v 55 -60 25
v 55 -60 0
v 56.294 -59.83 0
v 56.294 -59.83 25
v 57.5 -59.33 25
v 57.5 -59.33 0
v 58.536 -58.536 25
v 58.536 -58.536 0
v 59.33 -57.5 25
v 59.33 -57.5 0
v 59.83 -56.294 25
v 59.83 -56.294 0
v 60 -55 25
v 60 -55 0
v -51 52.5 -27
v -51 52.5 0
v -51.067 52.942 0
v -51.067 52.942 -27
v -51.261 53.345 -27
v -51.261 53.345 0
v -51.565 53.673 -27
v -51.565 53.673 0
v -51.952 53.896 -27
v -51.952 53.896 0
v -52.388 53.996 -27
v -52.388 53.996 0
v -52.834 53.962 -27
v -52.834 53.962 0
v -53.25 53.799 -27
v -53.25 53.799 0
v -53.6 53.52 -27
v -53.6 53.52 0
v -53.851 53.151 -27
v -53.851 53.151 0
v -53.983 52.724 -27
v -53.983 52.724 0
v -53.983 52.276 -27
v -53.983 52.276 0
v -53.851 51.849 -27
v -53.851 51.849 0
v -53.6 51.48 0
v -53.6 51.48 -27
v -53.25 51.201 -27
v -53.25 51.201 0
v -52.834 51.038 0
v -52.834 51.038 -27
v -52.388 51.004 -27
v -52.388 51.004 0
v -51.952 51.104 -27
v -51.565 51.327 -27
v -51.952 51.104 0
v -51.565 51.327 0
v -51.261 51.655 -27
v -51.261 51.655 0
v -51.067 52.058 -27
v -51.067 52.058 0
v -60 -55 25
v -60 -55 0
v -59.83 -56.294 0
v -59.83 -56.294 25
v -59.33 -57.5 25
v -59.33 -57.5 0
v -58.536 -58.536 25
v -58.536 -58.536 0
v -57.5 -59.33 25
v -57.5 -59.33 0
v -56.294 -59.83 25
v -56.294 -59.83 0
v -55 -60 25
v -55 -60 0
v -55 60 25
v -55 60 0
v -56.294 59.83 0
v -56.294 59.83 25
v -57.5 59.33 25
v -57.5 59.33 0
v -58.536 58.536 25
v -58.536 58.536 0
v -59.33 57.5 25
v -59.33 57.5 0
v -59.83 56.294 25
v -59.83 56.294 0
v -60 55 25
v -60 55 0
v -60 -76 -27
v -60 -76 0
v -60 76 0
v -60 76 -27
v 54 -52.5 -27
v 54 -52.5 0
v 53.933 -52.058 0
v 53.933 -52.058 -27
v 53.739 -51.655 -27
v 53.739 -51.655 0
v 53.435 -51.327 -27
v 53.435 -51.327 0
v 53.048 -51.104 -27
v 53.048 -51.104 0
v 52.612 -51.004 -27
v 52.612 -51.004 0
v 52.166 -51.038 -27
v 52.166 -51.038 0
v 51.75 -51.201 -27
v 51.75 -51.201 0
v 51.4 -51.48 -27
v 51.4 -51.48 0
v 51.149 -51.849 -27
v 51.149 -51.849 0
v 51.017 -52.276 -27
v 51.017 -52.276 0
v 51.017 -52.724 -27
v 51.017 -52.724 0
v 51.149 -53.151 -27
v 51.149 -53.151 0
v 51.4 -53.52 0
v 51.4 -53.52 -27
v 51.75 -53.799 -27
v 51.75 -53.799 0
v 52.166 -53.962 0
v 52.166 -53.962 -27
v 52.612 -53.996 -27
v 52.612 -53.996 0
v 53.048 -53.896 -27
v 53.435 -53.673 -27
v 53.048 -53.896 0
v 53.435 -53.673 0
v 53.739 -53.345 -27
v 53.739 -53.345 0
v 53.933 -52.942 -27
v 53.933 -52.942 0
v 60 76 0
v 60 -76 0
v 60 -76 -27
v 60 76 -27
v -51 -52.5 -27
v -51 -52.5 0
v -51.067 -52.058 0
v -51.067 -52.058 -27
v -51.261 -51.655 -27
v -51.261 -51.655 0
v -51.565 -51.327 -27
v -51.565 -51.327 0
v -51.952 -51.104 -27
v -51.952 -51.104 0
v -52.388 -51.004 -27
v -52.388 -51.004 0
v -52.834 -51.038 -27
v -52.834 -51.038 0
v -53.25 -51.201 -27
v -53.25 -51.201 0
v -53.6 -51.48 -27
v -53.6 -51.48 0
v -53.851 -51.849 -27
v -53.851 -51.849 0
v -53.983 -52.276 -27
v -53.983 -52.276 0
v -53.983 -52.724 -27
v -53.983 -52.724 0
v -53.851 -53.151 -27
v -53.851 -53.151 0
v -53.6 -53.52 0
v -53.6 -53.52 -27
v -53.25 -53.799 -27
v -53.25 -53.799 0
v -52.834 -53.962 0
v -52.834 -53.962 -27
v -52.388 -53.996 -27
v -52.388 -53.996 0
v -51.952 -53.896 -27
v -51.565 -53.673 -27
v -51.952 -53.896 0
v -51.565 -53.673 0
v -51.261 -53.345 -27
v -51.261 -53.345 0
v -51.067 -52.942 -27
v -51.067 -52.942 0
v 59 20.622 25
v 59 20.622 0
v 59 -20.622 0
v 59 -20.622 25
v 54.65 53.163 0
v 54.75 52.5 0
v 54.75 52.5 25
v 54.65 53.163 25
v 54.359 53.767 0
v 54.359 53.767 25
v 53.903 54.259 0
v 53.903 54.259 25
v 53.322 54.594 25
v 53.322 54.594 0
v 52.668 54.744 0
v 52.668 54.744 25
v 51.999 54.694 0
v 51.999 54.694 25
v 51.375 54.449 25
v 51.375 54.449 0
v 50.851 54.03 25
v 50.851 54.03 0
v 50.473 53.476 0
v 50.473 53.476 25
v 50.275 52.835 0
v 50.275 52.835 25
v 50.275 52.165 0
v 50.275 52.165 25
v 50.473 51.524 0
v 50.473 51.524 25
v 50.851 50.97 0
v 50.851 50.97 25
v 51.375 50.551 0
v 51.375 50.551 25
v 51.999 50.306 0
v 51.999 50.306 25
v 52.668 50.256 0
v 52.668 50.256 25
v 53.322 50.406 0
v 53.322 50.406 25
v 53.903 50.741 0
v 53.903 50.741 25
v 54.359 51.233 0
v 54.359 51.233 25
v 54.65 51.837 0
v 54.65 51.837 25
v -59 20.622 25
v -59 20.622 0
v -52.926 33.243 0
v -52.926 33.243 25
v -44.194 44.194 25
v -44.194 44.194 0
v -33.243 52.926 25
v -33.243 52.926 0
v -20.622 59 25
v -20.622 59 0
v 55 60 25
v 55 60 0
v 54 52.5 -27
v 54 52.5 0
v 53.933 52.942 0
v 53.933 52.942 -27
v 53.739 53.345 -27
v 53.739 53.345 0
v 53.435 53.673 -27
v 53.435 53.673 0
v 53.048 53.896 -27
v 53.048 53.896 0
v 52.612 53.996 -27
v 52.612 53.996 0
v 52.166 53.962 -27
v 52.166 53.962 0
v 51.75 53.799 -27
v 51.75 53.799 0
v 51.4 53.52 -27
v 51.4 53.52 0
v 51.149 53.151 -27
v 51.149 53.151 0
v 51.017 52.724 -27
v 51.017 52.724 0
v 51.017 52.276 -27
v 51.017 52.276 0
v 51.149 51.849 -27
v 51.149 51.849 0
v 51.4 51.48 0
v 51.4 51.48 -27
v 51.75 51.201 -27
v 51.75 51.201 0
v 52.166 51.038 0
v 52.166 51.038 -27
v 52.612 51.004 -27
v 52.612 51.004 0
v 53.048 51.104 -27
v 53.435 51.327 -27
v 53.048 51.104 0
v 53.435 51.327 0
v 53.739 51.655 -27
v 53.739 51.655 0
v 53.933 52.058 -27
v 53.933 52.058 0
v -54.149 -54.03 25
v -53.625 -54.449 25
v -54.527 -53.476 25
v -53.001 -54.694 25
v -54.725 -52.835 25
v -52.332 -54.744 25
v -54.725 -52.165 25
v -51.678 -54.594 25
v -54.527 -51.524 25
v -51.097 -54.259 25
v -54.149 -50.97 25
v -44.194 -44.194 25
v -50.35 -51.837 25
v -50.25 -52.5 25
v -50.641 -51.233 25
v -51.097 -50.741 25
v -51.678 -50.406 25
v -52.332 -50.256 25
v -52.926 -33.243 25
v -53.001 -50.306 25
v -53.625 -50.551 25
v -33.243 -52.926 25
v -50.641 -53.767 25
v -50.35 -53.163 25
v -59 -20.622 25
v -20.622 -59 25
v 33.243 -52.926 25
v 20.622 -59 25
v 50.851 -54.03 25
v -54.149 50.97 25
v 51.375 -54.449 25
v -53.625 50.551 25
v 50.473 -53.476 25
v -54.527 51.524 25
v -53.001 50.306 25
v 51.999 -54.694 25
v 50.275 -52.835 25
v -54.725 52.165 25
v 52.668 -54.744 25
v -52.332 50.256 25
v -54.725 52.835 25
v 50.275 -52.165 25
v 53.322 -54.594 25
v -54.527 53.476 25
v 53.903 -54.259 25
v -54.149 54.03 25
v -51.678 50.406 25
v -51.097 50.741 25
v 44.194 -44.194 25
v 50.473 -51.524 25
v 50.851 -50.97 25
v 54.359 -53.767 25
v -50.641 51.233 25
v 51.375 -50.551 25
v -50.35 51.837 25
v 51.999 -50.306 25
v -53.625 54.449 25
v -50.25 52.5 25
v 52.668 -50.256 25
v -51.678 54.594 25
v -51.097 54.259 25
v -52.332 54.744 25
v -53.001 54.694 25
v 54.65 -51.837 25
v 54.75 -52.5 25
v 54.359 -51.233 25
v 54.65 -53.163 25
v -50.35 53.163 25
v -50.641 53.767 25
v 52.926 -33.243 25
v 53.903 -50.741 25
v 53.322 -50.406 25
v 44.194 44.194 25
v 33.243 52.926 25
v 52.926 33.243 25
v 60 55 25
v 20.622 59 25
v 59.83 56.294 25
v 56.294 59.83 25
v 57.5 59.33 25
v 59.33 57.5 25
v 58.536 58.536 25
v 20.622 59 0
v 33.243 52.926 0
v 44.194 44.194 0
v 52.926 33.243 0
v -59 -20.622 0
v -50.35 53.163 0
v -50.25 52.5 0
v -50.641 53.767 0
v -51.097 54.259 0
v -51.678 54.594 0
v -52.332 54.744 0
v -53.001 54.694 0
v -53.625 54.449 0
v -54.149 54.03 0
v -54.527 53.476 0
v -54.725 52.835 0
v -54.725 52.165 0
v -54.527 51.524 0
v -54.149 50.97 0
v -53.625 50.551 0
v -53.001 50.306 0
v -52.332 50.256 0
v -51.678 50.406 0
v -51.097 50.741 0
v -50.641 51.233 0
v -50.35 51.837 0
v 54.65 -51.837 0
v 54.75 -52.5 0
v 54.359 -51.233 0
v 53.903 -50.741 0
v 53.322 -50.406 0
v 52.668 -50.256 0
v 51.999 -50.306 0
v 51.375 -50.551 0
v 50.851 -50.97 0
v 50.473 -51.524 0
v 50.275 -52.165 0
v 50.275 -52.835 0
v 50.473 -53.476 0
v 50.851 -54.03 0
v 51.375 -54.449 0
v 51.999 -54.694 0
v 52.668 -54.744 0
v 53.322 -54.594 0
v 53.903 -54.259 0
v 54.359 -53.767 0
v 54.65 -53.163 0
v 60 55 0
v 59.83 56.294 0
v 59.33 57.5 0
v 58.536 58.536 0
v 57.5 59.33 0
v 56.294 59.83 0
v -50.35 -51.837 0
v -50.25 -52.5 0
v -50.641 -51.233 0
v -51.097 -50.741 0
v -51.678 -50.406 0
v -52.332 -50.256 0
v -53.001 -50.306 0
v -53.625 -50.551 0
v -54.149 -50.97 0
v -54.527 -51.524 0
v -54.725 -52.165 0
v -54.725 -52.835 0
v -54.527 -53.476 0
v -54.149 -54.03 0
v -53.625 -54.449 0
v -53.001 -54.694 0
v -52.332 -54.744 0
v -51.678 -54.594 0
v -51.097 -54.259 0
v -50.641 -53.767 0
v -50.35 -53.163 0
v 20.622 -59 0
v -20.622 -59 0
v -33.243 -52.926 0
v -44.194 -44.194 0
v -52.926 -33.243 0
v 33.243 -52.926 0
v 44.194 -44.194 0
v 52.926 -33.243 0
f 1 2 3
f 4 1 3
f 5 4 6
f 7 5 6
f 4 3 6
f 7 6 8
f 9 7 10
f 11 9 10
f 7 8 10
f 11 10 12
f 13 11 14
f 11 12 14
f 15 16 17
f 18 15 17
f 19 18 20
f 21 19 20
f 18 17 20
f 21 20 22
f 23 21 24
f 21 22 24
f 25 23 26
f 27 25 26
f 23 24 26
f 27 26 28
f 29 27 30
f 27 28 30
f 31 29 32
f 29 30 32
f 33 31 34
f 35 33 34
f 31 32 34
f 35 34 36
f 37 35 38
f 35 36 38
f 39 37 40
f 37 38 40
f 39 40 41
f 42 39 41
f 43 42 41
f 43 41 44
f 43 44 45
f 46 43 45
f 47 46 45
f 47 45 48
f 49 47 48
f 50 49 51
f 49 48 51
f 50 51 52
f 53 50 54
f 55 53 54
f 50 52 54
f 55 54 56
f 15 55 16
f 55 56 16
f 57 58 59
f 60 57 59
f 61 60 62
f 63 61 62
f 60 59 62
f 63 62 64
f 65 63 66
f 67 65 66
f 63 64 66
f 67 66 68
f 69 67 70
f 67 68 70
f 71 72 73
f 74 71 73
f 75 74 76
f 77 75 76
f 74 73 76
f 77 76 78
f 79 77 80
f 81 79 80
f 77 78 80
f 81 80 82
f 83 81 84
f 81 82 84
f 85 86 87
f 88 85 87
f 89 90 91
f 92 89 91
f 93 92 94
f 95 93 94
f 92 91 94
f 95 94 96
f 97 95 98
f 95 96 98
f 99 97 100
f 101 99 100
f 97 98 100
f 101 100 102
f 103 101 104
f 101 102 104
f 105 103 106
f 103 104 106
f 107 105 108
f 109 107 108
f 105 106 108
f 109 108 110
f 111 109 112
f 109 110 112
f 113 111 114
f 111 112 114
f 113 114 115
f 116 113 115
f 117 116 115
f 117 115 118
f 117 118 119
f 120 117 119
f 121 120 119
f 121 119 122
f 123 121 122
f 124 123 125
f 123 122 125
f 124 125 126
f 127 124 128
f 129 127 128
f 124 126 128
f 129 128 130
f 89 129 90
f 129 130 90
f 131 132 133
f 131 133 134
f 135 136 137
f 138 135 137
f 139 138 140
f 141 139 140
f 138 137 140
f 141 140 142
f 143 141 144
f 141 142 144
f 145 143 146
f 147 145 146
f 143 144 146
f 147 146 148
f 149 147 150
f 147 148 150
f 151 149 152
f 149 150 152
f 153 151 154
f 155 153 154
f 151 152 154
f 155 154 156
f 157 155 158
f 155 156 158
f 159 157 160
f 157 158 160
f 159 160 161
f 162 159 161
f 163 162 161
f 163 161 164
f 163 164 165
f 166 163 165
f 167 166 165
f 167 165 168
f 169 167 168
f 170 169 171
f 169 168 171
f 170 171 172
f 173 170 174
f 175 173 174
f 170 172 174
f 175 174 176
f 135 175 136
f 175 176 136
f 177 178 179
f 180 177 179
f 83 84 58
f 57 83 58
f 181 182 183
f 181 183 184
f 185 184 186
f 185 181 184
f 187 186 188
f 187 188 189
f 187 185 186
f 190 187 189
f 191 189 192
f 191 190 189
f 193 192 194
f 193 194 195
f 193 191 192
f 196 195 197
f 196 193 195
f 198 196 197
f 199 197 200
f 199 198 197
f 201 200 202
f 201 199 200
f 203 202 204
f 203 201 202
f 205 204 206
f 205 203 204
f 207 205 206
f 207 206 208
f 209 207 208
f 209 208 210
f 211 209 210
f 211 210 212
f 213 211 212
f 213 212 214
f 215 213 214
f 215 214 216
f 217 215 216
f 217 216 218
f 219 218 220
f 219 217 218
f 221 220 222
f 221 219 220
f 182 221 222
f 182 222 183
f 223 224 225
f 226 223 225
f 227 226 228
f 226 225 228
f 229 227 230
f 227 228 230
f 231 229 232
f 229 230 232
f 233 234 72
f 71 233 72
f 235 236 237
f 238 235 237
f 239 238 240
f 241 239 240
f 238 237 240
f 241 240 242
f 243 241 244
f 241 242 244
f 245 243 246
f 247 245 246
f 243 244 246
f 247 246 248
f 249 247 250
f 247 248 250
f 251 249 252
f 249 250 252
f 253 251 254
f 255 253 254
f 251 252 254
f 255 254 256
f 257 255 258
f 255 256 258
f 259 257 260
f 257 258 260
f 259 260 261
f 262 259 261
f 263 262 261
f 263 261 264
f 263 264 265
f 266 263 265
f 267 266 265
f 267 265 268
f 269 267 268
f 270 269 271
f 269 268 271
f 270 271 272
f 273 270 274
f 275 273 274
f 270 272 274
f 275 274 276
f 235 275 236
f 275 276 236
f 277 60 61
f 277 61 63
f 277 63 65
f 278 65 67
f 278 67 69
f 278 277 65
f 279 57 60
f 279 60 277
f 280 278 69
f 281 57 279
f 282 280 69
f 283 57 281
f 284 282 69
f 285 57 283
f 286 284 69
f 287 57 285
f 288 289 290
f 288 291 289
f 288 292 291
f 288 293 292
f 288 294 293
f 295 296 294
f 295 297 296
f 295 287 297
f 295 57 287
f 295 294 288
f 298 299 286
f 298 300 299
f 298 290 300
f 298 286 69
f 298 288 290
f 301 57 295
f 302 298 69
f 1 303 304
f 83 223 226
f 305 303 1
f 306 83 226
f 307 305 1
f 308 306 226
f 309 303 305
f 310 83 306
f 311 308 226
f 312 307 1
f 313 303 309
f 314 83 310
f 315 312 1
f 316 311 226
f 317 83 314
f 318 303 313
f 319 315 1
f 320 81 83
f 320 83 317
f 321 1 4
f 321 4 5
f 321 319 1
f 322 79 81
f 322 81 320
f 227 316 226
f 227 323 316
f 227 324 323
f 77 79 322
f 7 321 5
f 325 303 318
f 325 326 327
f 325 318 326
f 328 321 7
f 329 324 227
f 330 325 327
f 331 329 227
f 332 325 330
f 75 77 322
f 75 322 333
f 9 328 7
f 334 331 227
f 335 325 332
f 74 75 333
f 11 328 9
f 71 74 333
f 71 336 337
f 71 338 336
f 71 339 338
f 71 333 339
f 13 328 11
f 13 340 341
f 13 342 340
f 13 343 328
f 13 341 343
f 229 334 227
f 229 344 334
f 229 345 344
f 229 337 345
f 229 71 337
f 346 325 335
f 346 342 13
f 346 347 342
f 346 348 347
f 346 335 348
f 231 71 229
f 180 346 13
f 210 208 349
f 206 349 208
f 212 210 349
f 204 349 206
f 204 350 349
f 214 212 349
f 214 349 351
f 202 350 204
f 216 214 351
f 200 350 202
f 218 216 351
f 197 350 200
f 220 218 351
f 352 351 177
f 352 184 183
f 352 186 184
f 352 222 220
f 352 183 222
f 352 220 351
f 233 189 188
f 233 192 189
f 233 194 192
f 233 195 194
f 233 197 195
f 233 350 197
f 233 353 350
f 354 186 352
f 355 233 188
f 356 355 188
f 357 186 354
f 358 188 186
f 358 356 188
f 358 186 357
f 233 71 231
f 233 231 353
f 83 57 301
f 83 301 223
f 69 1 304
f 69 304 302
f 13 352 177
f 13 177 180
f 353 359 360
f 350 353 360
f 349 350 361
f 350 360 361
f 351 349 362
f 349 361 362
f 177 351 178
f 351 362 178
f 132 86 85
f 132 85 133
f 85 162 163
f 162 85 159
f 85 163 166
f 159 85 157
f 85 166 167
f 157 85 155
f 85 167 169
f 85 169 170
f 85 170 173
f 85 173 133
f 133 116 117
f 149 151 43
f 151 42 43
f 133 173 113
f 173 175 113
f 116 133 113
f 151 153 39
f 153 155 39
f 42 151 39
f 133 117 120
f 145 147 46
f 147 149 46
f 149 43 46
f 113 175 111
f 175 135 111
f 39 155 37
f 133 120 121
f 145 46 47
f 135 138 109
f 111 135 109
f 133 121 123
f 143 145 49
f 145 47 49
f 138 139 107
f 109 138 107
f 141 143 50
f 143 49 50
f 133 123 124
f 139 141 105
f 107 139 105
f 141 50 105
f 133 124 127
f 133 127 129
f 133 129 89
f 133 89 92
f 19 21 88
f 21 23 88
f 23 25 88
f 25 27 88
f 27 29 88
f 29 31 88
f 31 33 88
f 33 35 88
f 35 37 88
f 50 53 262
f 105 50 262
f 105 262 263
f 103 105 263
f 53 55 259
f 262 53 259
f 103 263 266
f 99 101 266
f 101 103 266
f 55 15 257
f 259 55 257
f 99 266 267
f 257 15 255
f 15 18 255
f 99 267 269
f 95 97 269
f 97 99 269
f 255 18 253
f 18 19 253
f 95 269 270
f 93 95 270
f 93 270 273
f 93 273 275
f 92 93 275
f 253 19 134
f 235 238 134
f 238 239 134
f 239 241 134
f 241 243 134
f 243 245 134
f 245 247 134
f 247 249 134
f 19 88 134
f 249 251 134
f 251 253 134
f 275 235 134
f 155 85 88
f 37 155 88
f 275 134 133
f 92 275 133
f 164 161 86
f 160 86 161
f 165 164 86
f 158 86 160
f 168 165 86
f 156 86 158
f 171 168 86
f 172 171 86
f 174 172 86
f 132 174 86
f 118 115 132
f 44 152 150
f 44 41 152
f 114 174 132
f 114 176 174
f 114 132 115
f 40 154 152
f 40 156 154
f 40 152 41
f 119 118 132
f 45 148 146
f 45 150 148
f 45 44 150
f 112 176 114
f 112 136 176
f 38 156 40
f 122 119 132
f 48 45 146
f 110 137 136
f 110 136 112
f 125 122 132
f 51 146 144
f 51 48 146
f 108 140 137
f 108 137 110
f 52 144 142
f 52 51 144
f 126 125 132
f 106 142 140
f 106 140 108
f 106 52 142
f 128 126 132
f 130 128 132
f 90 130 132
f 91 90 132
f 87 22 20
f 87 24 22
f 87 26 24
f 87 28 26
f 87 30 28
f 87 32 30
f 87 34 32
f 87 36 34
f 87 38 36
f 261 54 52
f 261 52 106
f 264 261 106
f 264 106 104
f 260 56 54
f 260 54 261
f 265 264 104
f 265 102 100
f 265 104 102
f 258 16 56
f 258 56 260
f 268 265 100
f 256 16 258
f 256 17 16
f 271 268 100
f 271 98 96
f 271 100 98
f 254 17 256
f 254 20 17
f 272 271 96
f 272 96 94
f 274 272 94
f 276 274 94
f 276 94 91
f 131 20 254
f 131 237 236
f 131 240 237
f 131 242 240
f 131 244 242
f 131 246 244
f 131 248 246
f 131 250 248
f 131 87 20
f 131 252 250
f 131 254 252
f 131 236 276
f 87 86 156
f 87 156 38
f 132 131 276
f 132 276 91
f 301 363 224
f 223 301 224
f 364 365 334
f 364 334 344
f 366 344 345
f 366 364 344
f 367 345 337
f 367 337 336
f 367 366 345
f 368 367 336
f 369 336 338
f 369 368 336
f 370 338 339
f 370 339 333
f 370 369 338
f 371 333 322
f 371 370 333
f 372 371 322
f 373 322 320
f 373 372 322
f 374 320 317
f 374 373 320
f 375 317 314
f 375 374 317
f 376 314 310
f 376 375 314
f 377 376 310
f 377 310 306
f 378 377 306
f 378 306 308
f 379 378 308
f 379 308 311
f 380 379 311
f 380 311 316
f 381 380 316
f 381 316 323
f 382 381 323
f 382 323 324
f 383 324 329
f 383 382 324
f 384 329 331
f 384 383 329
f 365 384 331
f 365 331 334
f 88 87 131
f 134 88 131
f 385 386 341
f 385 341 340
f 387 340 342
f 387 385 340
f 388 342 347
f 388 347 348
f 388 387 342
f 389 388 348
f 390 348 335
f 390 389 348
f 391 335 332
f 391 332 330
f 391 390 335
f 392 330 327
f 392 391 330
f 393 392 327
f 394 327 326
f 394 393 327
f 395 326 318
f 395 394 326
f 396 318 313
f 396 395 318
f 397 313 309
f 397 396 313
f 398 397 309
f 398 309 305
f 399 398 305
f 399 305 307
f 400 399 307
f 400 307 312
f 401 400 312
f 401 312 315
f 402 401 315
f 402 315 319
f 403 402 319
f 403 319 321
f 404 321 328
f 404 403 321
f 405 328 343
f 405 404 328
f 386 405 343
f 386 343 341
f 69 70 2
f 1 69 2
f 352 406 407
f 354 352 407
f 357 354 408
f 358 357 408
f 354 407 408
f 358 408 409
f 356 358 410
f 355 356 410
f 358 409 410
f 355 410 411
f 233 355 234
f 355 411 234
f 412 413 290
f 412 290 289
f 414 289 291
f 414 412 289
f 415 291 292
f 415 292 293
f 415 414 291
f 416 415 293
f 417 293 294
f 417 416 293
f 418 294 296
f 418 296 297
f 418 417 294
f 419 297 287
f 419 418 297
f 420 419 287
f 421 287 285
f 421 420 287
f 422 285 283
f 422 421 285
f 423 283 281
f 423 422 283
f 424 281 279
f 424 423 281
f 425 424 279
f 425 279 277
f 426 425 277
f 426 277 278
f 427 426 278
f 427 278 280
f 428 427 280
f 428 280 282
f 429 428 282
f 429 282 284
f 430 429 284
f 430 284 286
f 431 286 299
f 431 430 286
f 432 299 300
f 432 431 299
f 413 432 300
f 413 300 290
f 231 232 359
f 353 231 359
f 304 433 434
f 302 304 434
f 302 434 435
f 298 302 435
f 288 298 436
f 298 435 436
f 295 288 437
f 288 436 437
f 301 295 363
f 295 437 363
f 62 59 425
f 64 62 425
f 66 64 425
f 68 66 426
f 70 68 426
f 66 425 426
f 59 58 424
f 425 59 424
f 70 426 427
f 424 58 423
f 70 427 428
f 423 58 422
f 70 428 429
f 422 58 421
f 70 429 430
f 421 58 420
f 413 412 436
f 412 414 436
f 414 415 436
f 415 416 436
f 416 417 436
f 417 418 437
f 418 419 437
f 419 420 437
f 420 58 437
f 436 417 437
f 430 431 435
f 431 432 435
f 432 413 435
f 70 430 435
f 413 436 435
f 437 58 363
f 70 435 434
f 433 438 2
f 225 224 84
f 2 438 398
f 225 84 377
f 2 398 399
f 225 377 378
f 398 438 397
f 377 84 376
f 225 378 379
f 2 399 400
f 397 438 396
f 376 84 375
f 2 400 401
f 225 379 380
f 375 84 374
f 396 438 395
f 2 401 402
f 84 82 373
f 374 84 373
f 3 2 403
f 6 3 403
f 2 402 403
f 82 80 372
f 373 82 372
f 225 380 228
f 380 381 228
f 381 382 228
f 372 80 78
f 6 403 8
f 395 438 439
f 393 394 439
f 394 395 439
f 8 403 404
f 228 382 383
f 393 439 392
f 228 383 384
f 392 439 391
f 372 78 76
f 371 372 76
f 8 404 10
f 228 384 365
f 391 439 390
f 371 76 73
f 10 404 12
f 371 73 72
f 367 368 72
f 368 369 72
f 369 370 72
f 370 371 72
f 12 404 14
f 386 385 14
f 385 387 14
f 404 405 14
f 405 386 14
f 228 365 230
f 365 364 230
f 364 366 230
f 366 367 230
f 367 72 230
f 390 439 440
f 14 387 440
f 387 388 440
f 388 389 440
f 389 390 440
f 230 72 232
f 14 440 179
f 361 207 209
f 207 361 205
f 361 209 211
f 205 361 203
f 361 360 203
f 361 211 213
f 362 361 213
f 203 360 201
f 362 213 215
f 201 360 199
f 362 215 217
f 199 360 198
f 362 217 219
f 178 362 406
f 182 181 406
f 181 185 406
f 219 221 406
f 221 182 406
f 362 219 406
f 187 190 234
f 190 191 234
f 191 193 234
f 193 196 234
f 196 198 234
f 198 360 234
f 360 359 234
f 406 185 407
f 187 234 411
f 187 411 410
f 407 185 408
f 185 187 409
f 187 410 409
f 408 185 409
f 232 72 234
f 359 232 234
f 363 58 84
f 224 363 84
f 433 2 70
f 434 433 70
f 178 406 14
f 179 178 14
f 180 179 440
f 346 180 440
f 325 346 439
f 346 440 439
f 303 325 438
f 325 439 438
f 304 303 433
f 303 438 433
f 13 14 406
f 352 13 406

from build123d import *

# Parameters (mm, degrees)
F0_R     = 2.25
F1_DEPTH = 25
F2_W     = 120
F2_H     = 152
F2_R     = 1.5
F3_DEPTH = 27


with BuildPart() as f1:
    # F0 (on Top) → F1 (new body)
    with BuildSketch(Plane.XY):
        with BuildLine():
            ThreePointArc((60, 55), (58.535534, 58.535534), (55, 60))
            Line((55, 60), (-55, 60))
            ThreePointArc((-55, 60), (-58.535534, 58.535534), (-60, 55))
            Line((-60, 55), (-60, -55))
            ThreePointArc((-60, -55), (-58.535534, -58.535534), (-55, -60))
            Line((-55, -60), (55, -60))
            ThreePointArc((55, -60), (58.535534, -58.535534), (60, -55))
            Line((60, -55), (60, 55))
        make_face()
        with Locations((-52.5, -52.5)):
            Circle(F0_R, mode=Mode.SUBTRACT)
        with Locations((52.5, -52.5)):
            Circle(F0_R, mode=Mode.SUBTRACT)
        with Locations((-52.5, 52.5)):
            Circle(F0_R, mode=Mode.SUBTRACT)
        with BuildLine():
            ThreePointArc((-59, 20.621591), (-44.194174, 44.194174), (-20.621591, 59))
            Line((-20.621591, 59), (20.621591, 59))
            ThreePointArc((20.621591, 59), (44.194174, 44.194174), (59, 20.621591))
            Line((59, 20.621591), (59, -20.621591))
            ThreePointArc((59, -20.621591), (44.194174, -44.194174), (20.621591, -59))
            Line((20.621591, -59), (-20.621591, -59))
            ThreePointArc((-20.621591, -59), (-44.194174, -44.194174), (-59, -20.621591))
            Line((-59, -20.621591), (-59, 20.621591))
        make_face(mode=Mode.SUBTRACT)
        with Locations((52.5, 52.5)):
            Circle(F0_R, mode=Mode.SUBTRACT)
    extrude(amount=F1_DEPTH)


with BuildPart() as f3:
    # F2 (on Top) → F3 (new body)
    with BuildSketch(Plane.XY):
        Rectangle(F2_W, F2_H)
        with Locations((-52.5, -52.5)):
            Circle(F2_R, mode=Mode.SUBTRACT)
        with Locations((52.5, -52.5)):
            Circle(F2_R, mode=Mode.SUBTRACT)
        with Locations((-52.5, 52.5)):
            Circle(F2_R, mode=Mode.SUBTRACT)
        with Locations((52.5, 52.5)):
            Circle(F2_R, mode=Mode.SUBTRACT)
    extrude(amount=-F3_DEPTH)


solid = Compound([f1.part, f3.part])
